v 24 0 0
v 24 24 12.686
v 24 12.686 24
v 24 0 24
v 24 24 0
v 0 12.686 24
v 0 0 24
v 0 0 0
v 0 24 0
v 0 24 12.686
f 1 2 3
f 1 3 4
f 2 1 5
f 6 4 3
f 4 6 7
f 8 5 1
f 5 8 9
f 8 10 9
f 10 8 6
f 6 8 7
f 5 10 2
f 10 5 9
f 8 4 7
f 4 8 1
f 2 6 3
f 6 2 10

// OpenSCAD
// Chamfer: a flat 45deg angled cut removing one edge of a block.
$fn = 32;
sx = 24; sy = 24; sz = 24;
c  = 8; // chamfer size

difference() {
    cube([sx, sy, sz]);
    // symmetric cutter centered exactly on the top-back edge (y=sy, z=sz)
    translate([sx / 2, sy, sz])
    rotate([45, 0, 0])
    cube([sx + 2, c * 2, c * 2], center = true);
}
